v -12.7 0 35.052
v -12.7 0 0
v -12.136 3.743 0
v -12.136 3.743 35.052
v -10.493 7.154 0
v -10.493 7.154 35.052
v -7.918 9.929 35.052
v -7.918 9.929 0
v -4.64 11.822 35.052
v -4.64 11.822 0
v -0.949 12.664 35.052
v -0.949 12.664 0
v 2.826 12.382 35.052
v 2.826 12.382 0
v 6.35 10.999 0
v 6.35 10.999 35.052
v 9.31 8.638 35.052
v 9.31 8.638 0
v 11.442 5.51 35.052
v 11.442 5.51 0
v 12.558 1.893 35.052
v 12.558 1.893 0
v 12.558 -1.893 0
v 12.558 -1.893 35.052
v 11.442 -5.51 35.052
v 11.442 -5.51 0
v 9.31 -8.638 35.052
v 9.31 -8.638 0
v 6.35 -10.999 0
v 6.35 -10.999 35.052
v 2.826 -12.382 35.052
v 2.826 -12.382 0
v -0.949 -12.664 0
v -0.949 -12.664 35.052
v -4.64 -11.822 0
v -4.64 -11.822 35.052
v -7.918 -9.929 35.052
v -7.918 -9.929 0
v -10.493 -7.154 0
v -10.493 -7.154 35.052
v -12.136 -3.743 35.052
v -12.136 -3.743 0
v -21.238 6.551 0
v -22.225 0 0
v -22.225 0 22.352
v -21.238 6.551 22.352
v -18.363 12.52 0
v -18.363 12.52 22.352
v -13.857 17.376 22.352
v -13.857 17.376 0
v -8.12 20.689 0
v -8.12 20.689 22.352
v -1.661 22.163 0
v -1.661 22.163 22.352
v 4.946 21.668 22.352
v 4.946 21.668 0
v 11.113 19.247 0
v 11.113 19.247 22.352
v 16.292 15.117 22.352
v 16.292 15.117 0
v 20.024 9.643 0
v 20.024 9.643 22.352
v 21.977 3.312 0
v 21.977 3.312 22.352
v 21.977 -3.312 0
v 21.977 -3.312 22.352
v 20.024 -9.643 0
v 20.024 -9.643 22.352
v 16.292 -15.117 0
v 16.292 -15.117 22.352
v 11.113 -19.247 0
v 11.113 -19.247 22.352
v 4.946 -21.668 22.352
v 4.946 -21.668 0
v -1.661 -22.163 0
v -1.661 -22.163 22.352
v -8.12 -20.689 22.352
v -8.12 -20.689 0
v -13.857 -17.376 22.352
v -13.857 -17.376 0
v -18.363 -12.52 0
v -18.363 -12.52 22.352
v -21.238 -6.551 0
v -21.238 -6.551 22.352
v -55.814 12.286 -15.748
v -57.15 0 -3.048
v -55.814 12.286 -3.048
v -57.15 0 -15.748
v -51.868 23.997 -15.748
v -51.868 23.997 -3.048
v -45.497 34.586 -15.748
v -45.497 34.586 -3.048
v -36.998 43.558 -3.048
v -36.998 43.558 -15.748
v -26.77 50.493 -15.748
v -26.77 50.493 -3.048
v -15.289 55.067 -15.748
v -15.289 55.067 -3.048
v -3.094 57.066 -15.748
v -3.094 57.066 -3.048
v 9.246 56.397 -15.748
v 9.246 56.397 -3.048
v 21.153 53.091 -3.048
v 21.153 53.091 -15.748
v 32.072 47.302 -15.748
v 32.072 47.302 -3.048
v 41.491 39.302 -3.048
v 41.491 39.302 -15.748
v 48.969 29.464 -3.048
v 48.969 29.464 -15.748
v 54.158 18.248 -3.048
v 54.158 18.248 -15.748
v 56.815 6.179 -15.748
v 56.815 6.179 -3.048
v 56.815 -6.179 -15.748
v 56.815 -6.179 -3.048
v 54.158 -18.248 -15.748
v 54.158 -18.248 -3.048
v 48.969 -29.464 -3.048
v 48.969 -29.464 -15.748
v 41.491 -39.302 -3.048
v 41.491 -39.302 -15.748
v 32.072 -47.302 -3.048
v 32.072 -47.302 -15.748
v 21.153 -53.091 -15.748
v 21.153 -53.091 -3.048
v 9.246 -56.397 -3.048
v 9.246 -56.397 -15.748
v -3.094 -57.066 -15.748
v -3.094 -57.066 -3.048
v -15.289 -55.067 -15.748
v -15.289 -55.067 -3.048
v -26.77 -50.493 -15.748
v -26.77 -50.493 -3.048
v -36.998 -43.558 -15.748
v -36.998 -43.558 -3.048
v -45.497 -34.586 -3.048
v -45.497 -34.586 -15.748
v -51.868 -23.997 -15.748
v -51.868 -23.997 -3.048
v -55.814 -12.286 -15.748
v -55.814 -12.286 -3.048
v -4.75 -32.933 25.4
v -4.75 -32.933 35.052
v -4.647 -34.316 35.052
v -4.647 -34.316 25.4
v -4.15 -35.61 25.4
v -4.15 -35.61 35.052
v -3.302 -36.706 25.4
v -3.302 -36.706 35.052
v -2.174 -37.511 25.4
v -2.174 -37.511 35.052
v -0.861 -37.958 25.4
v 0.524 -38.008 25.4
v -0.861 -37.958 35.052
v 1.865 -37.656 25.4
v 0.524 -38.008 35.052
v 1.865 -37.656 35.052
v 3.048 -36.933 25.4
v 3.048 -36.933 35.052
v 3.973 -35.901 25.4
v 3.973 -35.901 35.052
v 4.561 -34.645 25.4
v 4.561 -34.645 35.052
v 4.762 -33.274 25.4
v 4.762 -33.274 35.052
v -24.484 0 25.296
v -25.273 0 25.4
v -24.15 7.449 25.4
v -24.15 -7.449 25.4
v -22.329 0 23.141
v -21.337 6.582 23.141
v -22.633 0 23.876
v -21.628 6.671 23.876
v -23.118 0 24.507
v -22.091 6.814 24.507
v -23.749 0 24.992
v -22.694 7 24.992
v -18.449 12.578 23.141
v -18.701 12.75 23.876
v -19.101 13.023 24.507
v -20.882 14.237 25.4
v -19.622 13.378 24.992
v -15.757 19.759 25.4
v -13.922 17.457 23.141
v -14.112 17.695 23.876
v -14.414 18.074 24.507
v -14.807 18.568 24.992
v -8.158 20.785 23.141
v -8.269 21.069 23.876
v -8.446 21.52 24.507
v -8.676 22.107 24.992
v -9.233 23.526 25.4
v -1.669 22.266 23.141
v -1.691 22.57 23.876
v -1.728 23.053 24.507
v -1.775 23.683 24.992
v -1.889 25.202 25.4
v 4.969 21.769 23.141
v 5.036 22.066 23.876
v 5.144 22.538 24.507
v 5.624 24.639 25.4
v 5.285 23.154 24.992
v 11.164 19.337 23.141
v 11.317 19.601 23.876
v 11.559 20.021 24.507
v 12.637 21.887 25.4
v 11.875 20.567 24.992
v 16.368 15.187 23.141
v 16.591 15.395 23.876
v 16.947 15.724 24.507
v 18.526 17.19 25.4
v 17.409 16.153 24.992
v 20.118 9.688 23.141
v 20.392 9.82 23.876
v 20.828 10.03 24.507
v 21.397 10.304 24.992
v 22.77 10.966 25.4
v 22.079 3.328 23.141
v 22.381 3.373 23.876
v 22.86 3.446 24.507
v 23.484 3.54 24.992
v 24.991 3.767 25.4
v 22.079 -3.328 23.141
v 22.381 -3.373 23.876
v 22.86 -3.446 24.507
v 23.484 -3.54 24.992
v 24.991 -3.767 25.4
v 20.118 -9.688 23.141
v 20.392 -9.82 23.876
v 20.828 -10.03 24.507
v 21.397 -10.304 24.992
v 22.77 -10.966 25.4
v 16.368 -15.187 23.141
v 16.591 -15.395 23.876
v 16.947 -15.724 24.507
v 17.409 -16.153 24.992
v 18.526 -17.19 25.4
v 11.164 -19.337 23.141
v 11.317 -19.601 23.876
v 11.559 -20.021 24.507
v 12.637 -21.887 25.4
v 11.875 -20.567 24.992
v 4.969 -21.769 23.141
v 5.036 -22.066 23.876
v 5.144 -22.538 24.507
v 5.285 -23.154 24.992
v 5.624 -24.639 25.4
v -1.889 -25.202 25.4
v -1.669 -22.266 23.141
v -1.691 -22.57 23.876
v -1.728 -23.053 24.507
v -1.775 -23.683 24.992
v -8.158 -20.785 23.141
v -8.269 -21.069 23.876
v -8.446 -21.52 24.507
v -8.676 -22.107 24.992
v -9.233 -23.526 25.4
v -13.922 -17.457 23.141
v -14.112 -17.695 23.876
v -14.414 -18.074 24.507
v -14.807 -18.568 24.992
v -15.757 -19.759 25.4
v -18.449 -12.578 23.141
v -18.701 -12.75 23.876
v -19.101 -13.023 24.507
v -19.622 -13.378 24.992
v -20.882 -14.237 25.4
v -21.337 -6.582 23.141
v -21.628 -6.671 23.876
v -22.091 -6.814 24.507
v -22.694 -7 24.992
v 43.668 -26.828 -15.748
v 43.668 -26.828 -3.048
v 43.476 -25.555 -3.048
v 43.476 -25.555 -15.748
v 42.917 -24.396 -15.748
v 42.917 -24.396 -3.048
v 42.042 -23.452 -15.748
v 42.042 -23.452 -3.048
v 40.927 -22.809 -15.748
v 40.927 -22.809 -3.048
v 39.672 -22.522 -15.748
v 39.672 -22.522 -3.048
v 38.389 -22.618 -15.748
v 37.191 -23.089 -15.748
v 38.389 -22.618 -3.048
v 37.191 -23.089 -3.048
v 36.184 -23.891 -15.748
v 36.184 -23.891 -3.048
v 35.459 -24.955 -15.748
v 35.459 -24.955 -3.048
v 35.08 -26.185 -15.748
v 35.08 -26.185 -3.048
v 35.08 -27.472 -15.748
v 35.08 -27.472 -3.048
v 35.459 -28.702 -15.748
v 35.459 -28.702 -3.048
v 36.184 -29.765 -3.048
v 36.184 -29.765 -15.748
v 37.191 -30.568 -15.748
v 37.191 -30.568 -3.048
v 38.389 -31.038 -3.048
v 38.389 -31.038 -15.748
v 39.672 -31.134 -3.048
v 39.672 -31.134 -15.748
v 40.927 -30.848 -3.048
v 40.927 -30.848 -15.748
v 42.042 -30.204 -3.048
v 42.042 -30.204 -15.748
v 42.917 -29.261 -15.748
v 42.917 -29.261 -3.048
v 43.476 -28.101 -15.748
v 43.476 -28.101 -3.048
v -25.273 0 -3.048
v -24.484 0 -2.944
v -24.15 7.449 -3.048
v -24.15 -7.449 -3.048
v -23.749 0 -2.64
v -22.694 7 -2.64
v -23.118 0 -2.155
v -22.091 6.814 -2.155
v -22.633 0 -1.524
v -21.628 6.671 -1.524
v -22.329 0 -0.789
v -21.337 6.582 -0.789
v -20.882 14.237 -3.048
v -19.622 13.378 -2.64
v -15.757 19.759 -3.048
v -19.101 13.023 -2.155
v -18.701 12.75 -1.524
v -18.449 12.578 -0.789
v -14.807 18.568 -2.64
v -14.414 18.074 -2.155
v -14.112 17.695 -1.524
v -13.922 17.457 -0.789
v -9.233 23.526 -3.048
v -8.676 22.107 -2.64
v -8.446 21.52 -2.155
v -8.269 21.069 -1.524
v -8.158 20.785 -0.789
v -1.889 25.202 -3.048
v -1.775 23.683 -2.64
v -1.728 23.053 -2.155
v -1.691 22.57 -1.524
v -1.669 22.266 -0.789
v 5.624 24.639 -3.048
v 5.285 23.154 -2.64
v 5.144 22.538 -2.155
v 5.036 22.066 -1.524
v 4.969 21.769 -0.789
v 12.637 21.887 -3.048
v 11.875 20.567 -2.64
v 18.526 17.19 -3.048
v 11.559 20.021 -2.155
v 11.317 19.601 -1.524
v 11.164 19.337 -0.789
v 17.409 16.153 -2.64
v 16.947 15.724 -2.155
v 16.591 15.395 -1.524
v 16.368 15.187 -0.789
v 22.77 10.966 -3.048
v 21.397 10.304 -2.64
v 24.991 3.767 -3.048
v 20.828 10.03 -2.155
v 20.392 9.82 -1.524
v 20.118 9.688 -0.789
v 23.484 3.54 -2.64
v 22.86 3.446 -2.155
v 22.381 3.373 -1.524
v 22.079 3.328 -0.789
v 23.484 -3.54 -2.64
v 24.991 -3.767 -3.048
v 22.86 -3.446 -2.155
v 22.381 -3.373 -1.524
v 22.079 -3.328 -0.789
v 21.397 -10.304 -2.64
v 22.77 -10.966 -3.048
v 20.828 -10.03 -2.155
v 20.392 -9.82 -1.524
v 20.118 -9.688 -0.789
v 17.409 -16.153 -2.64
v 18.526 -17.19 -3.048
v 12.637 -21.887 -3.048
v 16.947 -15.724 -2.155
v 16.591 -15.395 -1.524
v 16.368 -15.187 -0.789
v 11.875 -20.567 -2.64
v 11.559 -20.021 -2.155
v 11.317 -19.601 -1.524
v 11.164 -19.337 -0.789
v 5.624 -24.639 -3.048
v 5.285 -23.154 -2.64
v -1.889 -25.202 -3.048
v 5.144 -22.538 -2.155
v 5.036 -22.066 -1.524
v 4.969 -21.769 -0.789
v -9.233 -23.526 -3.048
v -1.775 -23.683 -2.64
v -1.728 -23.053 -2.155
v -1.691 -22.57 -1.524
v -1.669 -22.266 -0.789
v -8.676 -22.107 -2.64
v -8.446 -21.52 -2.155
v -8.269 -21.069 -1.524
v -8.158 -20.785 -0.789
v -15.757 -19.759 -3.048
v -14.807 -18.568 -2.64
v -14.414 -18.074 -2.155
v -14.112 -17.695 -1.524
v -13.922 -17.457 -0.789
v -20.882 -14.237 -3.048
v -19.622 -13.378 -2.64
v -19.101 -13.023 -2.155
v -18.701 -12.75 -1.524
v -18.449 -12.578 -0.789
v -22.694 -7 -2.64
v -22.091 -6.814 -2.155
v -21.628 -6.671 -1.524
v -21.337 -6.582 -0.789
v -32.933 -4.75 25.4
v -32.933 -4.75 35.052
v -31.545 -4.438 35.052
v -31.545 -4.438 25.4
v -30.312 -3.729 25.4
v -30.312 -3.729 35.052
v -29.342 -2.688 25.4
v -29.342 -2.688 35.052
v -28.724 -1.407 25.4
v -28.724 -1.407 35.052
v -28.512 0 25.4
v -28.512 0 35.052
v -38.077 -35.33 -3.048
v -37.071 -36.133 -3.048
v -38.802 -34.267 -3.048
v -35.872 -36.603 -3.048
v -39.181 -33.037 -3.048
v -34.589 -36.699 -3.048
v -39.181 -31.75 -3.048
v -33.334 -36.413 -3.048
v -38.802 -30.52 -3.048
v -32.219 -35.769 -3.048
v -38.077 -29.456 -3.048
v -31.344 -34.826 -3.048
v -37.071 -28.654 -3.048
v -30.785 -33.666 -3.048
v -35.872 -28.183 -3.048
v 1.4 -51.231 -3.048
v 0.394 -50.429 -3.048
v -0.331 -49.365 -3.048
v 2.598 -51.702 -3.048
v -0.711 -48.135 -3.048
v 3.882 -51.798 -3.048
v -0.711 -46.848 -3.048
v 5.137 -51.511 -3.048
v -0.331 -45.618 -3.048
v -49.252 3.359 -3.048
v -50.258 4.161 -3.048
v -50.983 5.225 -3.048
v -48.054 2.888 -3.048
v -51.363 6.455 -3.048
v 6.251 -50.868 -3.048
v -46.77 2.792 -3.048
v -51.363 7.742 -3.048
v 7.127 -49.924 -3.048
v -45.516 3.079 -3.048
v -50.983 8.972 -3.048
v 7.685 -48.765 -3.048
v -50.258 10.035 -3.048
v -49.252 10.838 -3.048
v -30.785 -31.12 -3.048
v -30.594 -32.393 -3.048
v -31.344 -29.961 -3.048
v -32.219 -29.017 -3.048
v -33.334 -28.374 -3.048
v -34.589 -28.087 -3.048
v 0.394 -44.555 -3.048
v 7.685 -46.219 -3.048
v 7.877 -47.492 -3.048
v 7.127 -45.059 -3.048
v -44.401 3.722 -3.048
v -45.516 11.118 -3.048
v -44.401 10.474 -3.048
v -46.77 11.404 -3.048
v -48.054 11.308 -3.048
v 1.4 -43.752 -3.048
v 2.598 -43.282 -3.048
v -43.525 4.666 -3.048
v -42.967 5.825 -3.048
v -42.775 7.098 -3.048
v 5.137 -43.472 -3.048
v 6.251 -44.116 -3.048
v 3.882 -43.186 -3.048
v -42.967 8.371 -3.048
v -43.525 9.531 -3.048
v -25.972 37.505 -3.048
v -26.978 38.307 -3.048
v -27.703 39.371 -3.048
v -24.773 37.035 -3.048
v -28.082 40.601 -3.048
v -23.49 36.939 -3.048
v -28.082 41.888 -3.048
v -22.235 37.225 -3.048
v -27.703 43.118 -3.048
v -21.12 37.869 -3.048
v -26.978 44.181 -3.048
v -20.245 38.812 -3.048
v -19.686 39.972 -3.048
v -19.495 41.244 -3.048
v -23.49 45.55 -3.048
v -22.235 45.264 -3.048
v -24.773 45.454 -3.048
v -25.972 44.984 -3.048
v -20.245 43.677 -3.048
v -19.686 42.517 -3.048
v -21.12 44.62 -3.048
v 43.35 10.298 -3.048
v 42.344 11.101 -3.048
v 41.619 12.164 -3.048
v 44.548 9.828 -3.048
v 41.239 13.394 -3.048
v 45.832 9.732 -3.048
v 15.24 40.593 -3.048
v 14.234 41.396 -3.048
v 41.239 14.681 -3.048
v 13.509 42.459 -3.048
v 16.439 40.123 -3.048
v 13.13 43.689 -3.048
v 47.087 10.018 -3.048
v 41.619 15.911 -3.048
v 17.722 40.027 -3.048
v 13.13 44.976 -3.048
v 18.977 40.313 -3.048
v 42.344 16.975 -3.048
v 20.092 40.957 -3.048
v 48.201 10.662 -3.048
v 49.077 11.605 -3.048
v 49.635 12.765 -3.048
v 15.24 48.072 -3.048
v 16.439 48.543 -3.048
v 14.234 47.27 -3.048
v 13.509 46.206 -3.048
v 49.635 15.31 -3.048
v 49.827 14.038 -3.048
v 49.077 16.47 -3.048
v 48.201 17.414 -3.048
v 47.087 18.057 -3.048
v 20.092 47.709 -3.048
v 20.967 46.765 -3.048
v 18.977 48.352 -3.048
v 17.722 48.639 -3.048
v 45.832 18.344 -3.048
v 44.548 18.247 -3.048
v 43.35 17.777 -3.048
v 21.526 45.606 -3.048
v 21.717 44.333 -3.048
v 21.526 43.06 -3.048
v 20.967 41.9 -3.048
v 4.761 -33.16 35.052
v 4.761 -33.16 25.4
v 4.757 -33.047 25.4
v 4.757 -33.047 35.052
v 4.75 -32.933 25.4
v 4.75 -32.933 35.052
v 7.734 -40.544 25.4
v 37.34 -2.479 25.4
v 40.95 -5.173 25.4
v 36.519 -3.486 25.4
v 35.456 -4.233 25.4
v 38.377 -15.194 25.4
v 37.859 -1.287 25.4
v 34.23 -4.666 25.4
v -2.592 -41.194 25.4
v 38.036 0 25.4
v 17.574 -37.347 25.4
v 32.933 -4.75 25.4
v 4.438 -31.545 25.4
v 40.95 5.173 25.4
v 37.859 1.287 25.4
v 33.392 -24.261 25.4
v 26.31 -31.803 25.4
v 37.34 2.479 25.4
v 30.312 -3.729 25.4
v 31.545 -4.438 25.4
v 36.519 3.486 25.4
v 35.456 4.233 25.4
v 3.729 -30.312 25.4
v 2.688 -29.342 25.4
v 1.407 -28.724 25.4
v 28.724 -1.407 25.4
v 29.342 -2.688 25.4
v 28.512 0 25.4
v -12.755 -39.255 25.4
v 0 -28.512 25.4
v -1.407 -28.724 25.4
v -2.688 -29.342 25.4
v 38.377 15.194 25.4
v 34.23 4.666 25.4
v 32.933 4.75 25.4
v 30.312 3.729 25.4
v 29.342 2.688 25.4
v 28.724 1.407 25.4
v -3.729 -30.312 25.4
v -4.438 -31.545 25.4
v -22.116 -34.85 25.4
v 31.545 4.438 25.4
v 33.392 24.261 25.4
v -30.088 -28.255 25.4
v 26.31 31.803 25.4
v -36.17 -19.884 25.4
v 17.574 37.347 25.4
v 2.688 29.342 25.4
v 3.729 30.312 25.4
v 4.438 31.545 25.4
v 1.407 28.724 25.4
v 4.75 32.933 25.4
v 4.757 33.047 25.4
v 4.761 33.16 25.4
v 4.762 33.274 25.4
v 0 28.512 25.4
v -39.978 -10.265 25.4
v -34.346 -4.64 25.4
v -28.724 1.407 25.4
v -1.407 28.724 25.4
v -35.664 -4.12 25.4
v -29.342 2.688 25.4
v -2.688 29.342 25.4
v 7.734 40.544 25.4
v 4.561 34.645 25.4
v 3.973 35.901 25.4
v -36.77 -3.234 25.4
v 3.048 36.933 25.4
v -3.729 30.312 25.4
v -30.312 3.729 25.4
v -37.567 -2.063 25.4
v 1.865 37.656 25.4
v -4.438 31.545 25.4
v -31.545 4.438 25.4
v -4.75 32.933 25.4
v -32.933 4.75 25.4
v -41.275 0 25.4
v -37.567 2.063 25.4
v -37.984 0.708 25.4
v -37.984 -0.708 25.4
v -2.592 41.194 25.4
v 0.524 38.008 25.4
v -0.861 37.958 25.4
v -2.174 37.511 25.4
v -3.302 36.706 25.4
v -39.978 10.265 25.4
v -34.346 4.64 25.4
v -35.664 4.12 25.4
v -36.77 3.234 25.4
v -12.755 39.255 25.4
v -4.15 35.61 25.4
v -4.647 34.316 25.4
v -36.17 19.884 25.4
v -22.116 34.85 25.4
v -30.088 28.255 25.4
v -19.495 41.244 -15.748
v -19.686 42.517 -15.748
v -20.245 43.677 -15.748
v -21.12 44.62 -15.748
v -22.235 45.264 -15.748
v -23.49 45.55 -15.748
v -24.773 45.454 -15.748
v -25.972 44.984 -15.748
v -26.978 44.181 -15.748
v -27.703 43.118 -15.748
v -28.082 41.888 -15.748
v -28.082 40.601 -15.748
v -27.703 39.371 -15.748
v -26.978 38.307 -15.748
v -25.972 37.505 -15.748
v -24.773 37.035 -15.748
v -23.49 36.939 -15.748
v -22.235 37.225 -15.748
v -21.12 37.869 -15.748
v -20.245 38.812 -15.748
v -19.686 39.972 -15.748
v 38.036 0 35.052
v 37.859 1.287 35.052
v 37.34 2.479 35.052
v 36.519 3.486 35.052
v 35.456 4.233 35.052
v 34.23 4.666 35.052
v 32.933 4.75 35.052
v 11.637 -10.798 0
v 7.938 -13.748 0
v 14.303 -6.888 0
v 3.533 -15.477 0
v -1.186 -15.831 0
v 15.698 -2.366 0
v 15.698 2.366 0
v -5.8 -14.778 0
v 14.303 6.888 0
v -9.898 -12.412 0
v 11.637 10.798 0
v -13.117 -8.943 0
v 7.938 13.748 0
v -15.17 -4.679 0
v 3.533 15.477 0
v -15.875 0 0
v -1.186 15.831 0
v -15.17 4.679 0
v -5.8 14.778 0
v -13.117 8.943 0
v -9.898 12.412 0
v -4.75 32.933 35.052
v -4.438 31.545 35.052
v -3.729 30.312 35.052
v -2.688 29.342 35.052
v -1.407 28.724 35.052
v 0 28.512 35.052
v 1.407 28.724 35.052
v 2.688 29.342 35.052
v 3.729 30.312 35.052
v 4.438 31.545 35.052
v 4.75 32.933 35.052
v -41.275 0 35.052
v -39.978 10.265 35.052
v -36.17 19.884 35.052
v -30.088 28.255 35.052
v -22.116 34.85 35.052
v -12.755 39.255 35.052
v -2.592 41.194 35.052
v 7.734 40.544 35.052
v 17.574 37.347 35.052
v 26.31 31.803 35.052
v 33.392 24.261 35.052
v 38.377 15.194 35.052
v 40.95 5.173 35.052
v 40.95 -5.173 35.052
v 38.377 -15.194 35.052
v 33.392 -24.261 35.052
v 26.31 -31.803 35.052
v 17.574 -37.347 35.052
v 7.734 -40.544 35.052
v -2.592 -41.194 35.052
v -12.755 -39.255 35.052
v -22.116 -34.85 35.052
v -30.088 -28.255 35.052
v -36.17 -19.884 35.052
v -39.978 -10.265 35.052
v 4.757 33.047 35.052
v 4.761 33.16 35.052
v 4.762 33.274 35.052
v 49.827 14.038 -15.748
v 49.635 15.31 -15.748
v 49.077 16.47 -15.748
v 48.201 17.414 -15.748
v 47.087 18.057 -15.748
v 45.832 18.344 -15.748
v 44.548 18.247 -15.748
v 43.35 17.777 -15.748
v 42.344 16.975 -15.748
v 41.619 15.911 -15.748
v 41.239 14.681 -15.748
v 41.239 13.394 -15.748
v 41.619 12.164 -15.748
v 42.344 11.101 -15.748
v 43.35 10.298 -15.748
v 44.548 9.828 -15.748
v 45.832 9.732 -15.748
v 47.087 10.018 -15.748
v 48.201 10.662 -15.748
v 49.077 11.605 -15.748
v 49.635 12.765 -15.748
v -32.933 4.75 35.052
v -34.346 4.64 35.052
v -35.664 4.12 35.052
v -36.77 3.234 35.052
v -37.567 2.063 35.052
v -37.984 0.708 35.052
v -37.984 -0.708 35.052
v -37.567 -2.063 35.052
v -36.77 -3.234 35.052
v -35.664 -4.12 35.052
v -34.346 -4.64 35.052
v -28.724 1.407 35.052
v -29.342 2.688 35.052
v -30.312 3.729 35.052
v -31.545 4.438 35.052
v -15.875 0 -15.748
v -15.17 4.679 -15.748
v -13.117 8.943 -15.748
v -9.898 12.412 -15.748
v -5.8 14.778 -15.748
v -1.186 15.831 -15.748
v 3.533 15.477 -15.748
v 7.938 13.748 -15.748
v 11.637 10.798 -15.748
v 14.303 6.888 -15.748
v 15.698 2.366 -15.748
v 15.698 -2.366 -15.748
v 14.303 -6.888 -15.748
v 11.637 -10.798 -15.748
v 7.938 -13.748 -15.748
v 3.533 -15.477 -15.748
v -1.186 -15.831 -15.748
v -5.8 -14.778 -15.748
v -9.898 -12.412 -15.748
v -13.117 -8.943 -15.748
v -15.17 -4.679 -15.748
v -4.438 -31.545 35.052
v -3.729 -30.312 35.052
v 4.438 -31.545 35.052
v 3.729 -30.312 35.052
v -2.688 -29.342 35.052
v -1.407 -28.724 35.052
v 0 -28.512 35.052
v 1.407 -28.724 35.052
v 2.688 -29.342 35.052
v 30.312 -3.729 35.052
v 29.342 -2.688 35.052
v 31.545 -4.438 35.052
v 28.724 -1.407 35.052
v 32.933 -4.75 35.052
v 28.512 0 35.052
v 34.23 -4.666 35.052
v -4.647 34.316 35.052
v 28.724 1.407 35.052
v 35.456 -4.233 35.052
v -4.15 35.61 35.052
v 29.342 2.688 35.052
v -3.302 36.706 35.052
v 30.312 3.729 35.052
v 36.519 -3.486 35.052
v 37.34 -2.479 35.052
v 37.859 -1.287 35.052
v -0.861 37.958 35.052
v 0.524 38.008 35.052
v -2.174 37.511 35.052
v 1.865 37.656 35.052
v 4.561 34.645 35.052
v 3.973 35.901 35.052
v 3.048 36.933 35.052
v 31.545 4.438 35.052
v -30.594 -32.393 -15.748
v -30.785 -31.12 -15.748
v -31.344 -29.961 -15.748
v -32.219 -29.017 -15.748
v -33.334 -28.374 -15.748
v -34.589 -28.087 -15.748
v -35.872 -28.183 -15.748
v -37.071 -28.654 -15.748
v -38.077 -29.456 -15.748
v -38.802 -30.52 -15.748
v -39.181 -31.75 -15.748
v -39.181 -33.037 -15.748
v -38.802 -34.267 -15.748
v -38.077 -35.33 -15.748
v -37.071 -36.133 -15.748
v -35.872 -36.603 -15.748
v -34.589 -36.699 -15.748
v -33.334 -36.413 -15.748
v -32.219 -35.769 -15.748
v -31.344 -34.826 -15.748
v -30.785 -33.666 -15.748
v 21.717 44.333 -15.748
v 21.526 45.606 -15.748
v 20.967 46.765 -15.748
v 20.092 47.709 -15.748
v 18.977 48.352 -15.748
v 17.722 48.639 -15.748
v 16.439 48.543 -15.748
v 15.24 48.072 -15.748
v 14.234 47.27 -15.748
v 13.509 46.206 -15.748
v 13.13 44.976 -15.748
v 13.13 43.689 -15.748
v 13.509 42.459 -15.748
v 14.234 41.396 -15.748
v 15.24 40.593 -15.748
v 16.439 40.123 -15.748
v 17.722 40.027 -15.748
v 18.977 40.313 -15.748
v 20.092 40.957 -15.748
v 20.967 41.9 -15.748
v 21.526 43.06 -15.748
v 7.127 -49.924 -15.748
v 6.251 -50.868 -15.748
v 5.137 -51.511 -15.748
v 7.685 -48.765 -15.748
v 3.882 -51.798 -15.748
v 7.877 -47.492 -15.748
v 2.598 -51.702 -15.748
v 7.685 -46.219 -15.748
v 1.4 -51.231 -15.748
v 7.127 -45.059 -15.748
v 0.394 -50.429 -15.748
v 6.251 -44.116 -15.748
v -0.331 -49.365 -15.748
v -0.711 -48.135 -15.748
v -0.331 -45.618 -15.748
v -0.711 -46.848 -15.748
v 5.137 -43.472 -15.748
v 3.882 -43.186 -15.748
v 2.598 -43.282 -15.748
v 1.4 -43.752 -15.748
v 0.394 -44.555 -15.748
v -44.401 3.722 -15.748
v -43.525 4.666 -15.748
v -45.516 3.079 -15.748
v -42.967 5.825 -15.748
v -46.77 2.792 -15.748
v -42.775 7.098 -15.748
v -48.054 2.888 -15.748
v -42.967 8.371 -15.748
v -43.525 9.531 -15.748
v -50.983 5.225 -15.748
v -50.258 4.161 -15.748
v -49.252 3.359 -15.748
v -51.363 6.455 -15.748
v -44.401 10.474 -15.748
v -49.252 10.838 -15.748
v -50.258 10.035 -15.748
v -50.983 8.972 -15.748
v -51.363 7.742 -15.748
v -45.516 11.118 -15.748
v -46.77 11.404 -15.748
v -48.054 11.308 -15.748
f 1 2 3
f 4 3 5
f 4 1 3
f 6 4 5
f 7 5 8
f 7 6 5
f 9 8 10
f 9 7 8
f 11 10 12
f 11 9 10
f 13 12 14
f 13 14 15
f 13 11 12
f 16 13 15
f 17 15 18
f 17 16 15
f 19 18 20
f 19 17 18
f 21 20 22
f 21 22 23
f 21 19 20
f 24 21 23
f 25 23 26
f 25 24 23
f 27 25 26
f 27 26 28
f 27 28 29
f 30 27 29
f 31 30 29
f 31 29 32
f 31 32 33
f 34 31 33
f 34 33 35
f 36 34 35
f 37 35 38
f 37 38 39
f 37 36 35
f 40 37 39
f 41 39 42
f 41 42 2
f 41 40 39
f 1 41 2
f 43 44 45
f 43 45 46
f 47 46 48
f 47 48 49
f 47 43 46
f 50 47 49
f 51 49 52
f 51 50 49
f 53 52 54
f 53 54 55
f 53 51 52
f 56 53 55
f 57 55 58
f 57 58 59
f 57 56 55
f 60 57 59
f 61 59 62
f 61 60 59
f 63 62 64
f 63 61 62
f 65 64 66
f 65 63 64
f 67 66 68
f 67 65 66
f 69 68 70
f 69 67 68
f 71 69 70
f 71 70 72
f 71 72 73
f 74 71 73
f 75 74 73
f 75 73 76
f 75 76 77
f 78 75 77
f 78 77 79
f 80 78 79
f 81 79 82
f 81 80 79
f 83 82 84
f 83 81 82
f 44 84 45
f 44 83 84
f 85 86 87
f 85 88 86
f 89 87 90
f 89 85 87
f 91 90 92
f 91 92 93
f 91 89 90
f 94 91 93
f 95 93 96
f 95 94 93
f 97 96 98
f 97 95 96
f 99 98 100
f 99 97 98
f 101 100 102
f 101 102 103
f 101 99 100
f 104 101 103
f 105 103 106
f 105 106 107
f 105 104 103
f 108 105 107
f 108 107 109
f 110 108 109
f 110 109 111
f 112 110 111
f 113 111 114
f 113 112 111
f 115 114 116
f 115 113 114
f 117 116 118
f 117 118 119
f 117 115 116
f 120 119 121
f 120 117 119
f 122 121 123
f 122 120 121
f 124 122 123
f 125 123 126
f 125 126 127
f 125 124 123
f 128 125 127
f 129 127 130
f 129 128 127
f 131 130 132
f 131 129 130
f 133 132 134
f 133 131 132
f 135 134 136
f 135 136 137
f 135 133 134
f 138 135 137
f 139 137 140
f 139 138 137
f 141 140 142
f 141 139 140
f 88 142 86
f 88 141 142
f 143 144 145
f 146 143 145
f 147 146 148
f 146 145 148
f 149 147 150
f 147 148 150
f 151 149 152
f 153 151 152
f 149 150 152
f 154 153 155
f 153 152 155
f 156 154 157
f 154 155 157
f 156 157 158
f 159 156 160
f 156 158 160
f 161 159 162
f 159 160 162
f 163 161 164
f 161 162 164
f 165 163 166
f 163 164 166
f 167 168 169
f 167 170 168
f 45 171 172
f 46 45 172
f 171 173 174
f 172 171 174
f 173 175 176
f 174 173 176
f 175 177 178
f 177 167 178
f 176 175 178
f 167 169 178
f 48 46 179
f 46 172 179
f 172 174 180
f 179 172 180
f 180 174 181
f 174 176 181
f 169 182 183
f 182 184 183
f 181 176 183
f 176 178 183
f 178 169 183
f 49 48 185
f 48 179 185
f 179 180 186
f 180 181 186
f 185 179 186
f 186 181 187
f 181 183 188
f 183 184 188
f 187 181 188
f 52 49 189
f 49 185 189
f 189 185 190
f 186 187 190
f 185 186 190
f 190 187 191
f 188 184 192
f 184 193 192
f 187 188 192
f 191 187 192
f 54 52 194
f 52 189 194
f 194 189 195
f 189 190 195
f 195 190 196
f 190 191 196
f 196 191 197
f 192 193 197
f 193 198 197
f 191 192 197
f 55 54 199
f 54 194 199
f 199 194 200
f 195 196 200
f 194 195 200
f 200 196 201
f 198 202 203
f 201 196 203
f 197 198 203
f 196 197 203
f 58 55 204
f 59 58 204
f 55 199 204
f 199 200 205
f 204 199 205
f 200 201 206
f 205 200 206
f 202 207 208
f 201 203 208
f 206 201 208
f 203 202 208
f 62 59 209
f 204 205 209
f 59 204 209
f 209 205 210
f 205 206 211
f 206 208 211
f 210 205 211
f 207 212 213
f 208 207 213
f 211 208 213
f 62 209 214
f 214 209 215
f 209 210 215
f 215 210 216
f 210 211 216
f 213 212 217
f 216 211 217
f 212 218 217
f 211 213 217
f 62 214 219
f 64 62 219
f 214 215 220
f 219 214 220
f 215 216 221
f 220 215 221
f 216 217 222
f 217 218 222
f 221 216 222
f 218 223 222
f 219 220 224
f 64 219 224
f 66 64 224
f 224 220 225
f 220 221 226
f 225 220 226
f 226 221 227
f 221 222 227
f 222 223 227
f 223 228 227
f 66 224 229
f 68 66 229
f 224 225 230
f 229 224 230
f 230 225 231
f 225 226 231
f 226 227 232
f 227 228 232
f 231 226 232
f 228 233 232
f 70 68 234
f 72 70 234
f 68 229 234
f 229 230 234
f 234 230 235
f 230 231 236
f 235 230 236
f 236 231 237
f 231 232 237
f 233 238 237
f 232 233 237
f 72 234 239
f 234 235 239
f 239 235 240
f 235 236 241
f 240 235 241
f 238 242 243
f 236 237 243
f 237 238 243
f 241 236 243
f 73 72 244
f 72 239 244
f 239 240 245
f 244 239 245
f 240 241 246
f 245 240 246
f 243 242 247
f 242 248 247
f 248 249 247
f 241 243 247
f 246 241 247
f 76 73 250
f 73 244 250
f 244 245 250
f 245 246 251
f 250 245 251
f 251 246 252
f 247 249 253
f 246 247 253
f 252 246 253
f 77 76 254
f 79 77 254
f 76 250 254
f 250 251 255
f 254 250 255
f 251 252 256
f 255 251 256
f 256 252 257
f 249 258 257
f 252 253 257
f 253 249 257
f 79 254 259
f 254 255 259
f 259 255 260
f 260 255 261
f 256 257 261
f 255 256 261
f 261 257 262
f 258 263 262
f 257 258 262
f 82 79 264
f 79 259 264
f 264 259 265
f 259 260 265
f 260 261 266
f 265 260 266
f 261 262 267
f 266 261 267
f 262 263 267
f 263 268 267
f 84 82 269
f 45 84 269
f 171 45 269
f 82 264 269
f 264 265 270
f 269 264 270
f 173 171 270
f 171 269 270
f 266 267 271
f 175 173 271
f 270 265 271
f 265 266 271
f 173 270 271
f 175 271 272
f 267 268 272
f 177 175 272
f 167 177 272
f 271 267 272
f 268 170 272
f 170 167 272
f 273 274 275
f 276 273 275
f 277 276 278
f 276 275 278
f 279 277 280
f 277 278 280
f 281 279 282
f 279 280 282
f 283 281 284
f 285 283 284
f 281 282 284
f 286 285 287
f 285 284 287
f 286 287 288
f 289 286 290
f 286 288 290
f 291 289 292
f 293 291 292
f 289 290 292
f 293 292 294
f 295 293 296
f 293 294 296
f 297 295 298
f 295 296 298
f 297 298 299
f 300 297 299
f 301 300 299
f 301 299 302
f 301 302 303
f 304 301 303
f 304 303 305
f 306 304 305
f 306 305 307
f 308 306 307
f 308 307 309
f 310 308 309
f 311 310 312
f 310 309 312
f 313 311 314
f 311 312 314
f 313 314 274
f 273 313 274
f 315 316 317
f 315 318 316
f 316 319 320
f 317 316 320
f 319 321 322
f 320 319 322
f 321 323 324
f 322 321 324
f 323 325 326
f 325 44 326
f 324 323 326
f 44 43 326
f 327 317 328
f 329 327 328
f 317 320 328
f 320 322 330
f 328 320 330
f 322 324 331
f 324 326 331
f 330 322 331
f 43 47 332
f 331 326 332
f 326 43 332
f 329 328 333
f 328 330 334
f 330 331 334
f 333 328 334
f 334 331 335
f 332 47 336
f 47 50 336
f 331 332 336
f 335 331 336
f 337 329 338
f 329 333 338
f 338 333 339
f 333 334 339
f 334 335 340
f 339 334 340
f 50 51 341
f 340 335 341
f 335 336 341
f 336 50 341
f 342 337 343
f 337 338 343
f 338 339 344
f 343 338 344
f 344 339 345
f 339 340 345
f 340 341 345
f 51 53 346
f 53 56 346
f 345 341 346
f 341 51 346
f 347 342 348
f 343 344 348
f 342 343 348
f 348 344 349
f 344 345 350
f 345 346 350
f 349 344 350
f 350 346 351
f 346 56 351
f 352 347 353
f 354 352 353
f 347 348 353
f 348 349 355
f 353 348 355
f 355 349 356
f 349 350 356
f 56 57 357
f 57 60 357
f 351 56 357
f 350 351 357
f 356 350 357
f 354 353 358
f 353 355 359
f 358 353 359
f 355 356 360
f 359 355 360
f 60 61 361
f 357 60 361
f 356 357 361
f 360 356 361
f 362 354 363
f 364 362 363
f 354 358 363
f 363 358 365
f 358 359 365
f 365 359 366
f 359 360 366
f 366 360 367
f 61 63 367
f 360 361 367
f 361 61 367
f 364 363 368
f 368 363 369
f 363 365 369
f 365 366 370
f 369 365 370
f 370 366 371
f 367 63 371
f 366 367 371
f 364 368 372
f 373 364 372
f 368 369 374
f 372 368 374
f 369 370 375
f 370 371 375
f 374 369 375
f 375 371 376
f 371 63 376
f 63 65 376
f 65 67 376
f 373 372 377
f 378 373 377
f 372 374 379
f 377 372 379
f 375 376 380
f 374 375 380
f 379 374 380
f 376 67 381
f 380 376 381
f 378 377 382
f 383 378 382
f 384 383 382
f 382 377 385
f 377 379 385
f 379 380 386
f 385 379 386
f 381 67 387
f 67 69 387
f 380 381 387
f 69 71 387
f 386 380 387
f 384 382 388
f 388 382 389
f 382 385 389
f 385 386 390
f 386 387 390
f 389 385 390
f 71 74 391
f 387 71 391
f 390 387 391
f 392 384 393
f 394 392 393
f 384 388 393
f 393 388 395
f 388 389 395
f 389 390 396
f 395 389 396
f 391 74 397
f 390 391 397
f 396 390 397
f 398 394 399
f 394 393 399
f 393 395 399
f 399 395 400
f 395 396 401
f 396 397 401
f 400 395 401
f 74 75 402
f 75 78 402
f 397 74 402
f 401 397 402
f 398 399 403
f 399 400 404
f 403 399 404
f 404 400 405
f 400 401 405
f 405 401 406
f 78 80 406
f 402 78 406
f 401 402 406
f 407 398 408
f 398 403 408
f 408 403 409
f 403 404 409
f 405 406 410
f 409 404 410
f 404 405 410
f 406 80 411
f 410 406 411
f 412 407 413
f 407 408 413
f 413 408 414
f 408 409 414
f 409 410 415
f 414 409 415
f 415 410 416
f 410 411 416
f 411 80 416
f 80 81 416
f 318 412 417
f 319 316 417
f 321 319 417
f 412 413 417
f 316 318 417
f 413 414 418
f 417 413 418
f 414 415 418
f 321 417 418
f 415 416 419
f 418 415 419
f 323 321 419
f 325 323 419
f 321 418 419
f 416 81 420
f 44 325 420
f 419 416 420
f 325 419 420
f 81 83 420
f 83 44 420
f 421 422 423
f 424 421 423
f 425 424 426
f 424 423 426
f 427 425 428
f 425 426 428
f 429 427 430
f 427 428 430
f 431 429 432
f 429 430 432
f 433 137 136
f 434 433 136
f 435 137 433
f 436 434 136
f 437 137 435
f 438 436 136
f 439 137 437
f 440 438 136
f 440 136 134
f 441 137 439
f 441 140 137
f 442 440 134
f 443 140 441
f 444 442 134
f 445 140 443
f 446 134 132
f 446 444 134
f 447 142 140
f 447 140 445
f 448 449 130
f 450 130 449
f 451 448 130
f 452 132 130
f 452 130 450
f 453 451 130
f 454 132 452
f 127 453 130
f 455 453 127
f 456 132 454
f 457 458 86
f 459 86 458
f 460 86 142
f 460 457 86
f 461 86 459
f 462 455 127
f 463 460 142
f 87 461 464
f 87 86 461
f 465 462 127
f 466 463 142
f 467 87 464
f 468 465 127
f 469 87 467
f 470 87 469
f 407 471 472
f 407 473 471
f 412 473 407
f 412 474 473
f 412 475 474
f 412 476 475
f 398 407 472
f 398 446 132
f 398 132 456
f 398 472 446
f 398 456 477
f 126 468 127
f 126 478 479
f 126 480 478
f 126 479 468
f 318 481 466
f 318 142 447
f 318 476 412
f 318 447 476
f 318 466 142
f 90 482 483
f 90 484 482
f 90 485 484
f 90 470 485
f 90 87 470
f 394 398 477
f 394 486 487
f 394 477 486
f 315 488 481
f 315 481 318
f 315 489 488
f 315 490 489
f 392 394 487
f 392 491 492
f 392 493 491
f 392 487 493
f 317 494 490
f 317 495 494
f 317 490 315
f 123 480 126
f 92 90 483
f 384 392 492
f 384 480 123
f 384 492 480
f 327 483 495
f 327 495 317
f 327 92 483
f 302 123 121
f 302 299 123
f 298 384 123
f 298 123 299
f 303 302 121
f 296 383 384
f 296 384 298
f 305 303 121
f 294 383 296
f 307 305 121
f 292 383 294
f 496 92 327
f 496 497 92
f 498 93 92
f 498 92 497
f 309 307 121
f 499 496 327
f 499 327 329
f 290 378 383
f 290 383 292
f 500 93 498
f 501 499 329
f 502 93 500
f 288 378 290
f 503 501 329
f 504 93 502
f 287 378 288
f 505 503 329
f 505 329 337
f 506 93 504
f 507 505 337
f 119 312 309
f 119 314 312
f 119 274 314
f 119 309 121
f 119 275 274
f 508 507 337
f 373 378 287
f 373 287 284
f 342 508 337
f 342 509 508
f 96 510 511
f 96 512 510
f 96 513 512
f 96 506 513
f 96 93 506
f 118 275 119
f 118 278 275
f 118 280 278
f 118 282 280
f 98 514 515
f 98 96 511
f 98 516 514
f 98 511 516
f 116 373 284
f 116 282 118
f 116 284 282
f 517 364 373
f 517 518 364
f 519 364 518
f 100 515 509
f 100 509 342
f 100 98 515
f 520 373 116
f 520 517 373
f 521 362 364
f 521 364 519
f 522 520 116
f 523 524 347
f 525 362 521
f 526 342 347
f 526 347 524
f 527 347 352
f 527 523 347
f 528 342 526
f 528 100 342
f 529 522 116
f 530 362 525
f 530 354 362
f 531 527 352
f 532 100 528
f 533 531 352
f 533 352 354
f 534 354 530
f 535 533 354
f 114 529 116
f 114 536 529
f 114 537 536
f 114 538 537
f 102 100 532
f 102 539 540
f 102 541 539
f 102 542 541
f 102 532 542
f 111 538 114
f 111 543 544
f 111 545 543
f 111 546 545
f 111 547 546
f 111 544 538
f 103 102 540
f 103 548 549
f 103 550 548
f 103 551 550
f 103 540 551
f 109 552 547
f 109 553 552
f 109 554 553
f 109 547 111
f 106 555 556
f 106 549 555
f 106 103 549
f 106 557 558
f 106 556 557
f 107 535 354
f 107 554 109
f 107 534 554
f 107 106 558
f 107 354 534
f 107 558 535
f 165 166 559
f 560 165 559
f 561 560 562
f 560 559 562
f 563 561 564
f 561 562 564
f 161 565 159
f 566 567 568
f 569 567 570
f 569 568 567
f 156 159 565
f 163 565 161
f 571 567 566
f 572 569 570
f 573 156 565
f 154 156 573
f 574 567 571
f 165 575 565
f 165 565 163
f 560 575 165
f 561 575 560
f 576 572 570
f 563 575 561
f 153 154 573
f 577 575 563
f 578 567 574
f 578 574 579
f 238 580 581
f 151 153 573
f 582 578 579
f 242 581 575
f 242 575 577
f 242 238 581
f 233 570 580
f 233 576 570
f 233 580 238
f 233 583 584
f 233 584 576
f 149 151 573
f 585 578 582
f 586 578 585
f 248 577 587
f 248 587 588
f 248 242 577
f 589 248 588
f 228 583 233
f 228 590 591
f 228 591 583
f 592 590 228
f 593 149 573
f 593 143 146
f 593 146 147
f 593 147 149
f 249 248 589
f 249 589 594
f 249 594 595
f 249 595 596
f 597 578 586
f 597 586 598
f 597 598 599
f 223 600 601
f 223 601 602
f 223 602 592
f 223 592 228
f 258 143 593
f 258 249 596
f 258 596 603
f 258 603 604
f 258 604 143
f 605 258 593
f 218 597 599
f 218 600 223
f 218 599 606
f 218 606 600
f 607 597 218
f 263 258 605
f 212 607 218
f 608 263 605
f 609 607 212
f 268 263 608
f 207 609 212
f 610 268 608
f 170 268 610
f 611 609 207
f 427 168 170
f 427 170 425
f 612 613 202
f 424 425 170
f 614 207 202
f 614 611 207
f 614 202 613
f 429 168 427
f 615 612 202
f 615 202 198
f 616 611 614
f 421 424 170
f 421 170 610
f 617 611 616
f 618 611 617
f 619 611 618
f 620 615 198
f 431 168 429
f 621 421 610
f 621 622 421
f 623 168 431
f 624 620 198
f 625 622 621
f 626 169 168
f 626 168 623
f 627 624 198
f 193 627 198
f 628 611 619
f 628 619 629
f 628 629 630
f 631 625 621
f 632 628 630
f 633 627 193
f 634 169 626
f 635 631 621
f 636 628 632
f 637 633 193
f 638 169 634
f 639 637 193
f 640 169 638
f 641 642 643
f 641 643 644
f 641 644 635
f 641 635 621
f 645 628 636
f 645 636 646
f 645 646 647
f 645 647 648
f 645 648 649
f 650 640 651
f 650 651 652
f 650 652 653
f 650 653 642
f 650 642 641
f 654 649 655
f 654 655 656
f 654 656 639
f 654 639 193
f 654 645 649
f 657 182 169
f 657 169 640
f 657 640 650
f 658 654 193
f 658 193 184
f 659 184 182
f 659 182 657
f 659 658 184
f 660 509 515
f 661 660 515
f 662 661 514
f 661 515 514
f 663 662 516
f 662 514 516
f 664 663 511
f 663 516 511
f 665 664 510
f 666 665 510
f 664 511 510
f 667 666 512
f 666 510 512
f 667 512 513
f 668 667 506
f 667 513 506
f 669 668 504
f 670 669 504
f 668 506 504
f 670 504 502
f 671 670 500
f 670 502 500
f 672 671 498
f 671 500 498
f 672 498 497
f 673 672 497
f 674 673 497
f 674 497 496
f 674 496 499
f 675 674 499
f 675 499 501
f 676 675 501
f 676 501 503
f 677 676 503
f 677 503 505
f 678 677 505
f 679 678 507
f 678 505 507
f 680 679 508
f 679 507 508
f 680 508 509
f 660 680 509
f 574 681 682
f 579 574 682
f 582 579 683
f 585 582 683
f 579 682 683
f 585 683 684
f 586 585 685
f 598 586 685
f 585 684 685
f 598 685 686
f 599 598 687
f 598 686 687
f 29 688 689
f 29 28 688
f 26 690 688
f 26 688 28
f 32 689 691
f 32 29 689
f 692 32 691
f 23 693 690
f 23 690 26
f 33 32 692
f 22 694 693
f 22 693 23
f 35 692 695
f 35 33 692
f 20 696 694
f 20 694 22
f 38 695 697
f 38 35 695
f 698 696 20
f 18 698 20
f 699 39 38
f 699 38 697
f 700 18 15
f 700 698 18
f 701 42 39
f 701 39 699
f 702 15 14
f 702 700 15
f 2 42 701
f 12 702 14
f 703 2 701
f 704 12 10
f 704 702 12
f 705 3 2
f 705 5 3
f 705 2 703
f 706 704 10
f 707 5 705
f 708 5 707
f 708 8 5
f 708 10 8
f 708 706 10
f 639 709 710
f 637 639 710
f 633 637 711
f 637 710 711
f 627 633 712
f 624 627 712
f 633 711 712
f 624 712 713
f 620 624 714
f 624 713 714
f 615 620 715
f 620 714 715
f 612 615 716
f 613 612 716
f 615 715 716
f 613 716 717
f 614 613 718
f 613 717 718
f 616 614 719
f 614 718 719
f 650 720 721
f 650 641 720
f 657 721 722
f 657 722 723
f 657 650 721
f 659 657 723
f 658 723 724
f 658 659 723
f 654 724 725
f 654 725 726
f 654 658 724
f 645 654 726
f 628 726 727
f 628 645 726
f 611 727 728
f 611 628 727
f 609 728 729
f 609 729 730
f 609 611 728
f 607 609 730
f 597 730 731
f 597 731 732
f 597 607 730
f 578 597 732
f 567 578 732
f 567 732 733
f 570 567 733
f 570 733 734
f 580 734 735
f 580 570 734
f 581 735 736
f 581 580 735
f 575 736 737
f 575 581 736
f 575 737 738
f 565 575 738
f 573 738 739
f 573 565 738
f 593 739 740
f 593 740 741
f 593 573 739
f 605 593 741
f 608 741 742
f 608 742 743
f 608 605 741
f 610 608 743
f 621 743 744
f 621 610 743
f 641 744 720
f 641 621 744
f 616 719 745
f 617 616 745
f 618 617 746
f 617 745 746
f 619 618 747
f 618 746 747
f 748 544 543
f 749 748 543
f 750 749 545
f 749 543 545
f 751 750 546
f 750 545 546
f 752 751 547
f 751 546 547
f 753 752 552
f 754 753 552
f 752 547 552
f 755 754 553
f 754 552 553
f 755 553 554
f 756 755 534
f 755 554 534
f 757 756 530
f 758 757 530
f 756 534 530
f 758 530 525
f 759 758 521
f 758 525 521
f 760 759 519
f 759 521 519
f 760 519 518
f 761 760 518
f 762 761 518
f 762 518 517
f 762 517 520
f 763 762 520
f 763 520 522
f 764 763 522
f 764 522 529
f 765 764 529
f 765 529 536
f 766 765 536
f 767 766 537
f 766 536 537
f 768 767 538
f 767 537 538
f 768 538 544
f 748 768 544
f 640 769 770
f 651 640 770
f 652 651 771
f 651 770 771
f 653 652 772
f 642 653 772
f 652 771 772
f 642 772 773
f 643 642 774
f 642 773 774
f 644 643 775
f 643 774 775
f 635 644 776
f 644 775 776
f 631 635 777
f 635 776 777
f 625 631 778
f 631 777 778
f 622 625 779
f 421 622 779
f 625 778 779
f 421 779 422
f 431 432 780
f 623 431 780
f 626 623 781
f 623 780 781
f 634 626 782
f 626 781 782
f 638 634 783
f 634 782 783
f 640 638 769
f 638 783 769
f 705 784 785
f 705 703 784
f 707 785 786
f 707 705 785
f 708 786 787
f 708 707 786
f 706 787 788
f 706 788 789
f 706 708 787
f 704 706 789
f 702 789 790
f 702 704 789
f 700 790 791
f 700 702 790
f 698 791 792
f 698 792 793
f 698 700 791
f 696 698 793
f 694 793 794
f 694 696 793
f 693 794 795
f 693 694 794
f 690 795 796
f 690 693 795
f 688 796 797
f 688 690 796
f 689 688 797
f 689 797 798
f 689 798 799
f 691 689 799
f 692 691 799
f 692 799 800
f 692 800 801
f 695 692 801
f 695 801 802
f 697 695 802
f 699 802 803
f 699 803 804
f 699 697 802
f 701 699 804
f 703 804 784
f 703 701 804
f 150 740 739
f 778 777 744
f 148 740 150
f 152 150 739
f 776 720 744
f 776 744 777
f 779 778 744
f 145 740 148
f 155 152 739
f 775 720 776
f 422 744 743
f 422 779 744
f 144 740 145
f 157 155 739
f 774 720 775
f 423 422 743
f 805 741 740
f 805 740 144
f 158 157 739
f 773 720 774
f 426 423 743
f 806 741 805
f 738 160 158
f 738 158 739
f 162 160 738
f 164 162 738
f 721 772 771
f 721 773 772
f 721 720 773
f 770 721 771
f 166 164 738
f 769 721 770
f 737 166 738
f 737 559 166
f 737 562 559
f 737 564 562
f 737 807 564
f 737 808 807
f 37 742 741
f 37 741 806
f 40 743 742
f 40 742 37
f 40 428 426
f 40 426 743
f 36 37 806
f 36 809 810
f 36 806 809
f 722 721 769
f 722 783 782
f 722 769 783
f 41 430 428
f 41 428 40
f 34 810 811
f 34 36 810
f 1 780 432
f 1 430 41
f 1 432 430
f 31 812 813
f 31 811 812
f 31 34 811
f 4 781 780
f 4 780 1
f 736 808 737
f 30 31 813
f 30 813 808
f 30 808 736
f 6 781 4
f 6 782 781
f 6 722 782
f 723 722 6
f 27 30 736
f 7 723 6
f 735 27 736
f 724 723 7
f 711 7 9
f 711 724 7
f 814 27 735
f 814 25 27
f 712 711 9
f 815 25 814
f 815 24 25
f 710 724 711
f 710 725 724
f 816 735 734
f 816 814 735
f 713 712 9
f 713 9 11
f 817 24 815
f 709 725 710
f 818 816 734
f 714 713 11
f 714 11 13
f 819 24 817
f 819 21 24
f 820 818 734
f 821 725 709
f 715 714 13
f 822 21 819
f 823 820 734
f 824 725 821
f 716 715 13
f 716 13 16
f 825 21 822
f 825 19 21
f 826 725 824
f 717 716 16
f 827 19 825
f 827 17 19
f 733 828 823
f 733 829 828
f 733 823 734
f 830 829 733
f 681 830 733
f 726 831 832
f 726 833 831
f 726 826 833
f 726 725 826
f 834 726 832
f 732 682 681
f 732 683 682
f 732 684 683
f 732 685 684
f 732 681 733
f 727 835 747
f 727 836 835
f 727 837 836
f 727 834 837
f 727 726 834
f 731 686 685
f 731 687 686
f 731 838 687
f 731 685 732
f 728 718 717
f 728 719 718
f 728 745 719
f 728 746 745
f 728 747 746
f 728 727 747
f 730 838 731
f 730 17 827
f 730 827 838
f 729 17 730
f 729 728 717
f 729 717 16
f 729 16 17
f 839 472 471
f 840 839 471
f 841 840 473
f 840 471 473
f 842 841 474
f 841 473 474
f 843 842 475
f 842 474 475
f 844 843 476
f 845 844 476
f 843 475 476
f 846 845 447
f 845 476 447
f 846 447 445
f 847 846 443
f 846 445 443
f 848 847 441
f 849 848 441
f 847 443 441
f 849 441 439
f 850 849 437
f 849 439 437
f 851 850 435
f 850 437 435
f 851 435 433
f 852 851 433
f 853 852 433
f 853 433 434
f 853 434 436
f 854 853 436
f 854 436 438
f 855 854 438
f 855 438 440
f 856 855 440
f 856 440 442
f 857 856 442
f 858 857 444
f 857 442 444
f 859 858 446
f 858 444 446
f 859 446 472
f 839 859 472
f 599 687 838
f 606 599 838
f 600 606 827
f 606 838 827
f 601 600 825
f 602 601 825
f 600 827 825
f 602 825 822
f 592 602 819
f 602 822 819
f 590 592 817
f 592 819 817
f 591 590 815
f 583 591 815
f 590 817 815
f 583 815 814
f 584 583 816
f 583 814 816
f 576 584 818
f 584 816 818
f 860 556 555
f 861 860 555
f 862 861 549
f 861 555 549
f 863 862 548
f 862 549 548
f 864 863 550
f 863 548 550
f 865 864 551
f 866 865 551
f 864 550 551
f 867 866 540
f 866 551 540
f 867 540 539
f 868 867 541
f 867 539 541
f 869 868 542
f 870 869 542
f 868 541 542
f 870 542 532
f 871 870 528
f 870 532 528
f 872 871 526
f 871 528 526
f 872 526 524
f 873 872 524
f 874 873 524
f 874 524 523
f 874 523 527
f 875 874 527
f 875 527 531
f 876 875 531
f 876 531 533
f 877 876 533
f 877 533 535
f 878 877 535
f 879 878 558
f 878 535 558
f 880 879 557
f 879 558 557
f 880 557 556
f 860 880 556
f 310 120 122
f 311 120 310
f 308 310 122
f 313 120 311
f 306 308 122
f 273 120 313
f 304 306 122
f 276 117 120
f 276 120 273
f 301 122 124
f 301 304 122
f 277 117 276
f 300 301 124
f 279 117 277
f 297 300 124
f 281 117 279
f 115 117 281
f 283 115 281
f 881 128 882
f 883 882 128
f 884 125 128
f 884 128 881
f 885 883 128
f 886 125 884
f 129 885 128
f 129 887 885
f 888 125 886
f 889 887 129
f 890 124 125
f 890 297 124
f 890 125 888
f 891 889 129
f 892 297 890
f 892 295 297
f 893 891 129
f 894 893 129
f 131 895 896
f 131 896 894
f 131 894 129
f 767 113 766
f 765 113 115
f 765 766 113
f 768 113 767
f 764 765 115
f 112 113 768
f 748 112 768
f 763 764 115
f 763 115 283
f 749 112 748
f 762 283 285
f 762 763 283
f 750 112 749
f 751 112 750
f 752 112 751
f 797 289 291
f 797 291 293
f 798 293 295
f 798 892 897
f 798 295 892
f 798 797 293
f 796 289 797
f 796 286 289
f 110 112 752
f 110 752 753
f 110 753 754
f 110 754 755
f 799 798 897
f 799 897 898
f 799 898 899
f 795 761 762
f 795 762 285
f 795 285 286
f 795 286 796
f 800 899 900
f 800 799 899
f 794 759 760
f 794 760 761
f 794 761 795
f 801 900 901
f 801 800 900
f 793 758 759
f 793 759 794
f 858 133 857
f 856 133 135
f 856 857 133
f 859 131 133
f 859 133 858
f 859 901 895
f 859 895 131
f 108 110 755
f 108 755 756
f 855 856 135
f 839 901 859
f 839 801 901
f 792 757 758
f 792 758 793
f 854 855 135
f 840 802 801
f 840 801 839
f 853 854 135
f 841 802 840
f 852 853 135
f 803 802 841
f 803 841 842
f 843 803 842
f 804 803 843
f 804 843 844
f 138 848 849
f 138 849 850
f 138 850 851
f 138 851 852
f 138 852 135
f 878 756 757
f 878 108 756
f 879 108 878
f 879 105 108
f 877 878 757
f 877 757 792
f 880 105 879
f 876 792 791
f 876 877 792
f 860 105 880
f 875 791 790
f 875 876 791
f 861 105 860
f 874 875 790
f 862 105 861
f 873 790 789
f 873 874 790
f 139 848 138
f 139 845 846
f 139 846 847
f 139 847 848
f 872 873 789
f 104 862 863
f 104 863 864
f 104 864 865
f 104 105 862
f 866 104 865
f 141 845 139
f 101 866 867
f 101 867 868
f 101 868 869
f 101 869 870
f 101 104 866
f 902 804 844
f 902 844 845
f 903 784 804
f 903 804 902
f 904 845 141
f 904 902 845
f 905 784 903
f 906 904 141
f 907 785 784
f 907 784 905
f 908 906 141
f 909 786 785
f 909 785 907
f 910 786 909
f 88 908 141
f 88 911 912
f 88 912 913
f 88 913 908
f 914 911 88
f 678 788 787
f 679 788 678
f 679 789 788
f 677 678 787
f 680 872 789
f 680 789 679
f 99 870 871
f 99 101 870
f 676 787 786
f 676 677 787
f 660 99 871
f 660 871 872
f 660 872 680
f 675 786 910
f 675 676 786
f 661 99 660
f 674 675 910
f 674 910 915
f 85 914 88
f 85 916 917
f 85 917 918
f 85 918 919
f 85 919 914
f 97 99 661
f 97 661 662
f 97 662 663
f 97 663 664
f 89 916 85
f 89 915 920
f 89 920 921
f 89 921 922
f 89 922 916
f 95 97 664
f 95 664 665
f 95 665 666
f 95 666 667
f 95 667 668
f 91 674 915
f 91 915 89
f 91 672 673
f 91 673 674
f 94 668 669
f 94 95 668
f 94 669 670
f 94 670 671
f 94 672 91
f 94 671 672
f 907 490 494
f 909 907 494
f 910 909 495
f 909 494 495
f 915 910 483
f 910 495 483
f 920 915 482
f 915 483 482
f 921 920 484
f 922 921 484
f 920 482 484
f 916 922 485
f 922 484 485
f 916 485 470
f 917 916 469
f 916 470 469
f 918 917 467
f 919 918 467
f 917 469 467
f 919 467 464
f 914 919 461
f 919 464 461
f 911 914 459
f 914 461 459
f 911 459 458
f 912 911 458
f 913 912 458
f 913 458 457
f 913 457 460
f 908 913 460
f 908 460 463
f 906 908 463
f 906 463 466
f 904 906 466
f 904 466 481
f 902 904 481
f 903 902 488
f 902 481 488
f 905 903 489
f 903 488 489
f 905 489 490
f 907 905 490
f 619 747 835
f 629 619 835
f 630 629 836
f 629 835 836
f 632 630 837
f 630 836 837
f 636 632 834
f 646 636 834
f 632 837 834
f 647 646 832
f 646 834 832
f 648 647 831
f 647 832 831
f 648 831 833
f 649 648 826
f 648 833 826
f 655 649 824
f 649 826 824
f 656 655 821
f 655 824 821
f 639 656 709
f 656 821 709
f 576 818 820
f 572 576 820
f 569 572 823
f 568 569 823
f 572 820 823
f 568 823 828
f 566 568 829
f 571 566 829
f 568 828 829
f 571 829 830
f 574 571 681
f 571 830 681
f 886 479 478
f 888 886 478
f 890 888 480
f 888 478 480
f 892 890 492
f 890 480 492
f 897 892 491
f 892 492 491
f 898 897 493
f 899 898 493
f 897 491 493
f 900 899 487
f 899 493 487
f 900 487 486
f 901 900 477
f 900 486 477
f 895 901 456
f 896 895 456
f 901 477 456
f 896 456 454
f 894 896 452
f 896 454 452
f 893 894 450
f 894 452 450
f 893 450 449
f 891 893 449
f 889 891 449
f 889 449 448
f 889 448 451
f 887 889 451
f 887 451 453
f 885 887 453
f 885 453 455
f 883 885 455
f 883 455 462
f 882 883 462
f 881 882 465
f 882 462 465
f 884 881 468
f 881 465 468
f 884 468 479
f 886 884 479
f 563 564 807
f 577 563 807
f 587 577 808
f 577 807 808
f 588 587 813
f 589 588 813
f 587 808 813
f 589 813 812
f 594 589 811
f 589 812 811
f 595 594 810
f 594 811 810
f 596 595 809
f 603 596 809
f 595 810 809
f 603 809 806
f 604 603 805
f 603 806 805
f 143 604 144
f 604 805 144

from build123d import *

# Parameters (mm, degrees)
F4_DEPTH = 9.652
F5_R     = 4.318
F6_DEPTH = 12.7
F7_R     = 3.048


with BuildPart() as f1:
    # F0 (on Front) → F1 (revolve)
    with BuildSketch(Plane.XZ):
        Polygon((-57.15, -3.048), (-57.15, -15.748), (-15.875, -15.748), (-15.875, 0), (-12.7, 0), (-12.7, 35.052), (-41.275, 35.052), (-41.275, 25.4), (-22.225, 25.4), (-22.225, -3.048), align=None)
    revolve(axis=Axis((0, 0, 1.128893124), (0, 0, -1)))

    # F2 (on face) → F4 (cut, through all)
    with BuildSketch(Plane.XY.offset(35.052)):
        with BuildLine():
            ThreePointArc((-4.7502886947, 32.9331722328), (0, 28.5115), (4.7502886947, 32.9331722328))
            ThreePointArc((4.7502886947, 32.9331722328), (0, 33.274), (-4.7502886947, 32.9331722328))
        make_face()
        with BuildLine():
            ThreePointArc((-4.7502886947, 32.9331722328), (0, 33.274), (4.7502886947, 32.9331722328))
            ThreePointArc((4.7502886947, 32.9331722328), (4.7594461946, 33.1034767737), (4.7625, 33.274))
            ThreePointArc((4.7625, 33.274), (-0.1705232263, 38.0334461946), (-4.7502886947, 32.9331722328))
        make_face()
        with BuildLine():
            ThreePointArc((32.9331722328, -4.7502886947), (33.1886836804, -2.38125), (33.274, 0))
            ThreePointArc((33.274, 0), (33.1886836804, 2.38125), (32.9331722328, 4.7502886947))
            ThreePointArc((32.9331722328, 4.7502886947), (28.5115, 0), (32.9331722328, -4.7502886947))
        make_face()
        with BuildLine():
            ThreePointArc((32.9331722328, 4.7502886947), (33.1886836804, 2.38125), (33.274, 0))
            ThreePointArc((33.274, 0), (33.1886836804, -2.38125), (32.9331722328, -4.7502886947))
            ThreePointArc((32.9331722328, -4.7502886947), (36.5188585492, -3.4860148086), (38.0365, 0))
            ThreePointArc((38.0365, 0), (36.5188585492, 3.4860148086), (32.9331722328, 4.7502886947))
        make_face()
        with BuildLine():
            ThreePointArc((4.7625, -33.274), (4.7594461946, -33.1034767737), (4.7502886947, -32.9331722328))
            ThreePointArc((4.7502886947, -32.9331722328), (0, -33.274), (-4.7502886947, -32.9331722328))
            ThreePointArc((-4.7502886947, -32.9331722328), (-0.1705232263, -38.0334461946), (4.7625, -33.274))
        make_face()
        with BuildLine():
            ThreePointArc((-4.7502886947, -32.9331722328), (0, -33.274), (4.7502886947, -32.9331722328))
            ThreePointArc((4.7502886947, -32.9331722328), (0, -28.5115), (-4.7502886947, -32.9331722328))
        make_face()
        with BuildLine():
            ThreePointArc((-28.5115, 0), (-29.7879851914, 3.2448585492), (-32.9331722328, 4.7502886947))
            ThreePointArc((-32.9331722328, 4.7502886947), (-33.274, 0), (-32.9331722328, -4.7502886947))
            ThreePointArc((-32.9331722328, -4.7502886947), (-29.7879851914, -3.2448585492), (-28.5115, 0))
        make_face()
        with BuildLine():
            ThreePointArc((-32.9331722328, -4.7502886947), (-33.274, 0), (-32.9331722328, 4.7502886947))
            ThreePointArc((-32.9331722328, 4.7502886947), (-38.0365, 0), (-32.9331722328, -4.7502886947))
        make_face()
    extrude(amount=-F4_DEPTH, mode=Mode.SUBTRACT)

    # F5 (on face) → F6 (cut, through all)
    with BuildSketch(Plane.XY.offset(-3.048)):
        with Locations((-23.8125, 41.2444598552)):
            Circle(F5_R)
        with Locations((-47.093068099, 7.0981379266)):
            Circle(F5_R)
        with Locations((-34.9115953959, -32.3932266363)):
            Circle(F5_R)
        with Locations((3.5590207071, -47.4918308408)):
            Circle(F5_R)
        with Locations((39.3496216268, -26.8281177653)):
            Circle(F5_R)
        with Locations((45.5091548756, 14.0377151813)):
            Circle(F5_R)
        with Locations((17.3993662854, 44.3328622792)):
            Circle(F5_R)
    extrude(amount=-F6_DEPTH, mode=Mode.SUBTRACT)

    # F7
    f7_edges = [f1.edges().sort_by_distance(p)[0] for p in [
        (22.225, 0, -3.048),
        (22.225, 0, 25.4),
    ]]
    fillet(f7_edges, radius=F7_R)


solid = f1.part
